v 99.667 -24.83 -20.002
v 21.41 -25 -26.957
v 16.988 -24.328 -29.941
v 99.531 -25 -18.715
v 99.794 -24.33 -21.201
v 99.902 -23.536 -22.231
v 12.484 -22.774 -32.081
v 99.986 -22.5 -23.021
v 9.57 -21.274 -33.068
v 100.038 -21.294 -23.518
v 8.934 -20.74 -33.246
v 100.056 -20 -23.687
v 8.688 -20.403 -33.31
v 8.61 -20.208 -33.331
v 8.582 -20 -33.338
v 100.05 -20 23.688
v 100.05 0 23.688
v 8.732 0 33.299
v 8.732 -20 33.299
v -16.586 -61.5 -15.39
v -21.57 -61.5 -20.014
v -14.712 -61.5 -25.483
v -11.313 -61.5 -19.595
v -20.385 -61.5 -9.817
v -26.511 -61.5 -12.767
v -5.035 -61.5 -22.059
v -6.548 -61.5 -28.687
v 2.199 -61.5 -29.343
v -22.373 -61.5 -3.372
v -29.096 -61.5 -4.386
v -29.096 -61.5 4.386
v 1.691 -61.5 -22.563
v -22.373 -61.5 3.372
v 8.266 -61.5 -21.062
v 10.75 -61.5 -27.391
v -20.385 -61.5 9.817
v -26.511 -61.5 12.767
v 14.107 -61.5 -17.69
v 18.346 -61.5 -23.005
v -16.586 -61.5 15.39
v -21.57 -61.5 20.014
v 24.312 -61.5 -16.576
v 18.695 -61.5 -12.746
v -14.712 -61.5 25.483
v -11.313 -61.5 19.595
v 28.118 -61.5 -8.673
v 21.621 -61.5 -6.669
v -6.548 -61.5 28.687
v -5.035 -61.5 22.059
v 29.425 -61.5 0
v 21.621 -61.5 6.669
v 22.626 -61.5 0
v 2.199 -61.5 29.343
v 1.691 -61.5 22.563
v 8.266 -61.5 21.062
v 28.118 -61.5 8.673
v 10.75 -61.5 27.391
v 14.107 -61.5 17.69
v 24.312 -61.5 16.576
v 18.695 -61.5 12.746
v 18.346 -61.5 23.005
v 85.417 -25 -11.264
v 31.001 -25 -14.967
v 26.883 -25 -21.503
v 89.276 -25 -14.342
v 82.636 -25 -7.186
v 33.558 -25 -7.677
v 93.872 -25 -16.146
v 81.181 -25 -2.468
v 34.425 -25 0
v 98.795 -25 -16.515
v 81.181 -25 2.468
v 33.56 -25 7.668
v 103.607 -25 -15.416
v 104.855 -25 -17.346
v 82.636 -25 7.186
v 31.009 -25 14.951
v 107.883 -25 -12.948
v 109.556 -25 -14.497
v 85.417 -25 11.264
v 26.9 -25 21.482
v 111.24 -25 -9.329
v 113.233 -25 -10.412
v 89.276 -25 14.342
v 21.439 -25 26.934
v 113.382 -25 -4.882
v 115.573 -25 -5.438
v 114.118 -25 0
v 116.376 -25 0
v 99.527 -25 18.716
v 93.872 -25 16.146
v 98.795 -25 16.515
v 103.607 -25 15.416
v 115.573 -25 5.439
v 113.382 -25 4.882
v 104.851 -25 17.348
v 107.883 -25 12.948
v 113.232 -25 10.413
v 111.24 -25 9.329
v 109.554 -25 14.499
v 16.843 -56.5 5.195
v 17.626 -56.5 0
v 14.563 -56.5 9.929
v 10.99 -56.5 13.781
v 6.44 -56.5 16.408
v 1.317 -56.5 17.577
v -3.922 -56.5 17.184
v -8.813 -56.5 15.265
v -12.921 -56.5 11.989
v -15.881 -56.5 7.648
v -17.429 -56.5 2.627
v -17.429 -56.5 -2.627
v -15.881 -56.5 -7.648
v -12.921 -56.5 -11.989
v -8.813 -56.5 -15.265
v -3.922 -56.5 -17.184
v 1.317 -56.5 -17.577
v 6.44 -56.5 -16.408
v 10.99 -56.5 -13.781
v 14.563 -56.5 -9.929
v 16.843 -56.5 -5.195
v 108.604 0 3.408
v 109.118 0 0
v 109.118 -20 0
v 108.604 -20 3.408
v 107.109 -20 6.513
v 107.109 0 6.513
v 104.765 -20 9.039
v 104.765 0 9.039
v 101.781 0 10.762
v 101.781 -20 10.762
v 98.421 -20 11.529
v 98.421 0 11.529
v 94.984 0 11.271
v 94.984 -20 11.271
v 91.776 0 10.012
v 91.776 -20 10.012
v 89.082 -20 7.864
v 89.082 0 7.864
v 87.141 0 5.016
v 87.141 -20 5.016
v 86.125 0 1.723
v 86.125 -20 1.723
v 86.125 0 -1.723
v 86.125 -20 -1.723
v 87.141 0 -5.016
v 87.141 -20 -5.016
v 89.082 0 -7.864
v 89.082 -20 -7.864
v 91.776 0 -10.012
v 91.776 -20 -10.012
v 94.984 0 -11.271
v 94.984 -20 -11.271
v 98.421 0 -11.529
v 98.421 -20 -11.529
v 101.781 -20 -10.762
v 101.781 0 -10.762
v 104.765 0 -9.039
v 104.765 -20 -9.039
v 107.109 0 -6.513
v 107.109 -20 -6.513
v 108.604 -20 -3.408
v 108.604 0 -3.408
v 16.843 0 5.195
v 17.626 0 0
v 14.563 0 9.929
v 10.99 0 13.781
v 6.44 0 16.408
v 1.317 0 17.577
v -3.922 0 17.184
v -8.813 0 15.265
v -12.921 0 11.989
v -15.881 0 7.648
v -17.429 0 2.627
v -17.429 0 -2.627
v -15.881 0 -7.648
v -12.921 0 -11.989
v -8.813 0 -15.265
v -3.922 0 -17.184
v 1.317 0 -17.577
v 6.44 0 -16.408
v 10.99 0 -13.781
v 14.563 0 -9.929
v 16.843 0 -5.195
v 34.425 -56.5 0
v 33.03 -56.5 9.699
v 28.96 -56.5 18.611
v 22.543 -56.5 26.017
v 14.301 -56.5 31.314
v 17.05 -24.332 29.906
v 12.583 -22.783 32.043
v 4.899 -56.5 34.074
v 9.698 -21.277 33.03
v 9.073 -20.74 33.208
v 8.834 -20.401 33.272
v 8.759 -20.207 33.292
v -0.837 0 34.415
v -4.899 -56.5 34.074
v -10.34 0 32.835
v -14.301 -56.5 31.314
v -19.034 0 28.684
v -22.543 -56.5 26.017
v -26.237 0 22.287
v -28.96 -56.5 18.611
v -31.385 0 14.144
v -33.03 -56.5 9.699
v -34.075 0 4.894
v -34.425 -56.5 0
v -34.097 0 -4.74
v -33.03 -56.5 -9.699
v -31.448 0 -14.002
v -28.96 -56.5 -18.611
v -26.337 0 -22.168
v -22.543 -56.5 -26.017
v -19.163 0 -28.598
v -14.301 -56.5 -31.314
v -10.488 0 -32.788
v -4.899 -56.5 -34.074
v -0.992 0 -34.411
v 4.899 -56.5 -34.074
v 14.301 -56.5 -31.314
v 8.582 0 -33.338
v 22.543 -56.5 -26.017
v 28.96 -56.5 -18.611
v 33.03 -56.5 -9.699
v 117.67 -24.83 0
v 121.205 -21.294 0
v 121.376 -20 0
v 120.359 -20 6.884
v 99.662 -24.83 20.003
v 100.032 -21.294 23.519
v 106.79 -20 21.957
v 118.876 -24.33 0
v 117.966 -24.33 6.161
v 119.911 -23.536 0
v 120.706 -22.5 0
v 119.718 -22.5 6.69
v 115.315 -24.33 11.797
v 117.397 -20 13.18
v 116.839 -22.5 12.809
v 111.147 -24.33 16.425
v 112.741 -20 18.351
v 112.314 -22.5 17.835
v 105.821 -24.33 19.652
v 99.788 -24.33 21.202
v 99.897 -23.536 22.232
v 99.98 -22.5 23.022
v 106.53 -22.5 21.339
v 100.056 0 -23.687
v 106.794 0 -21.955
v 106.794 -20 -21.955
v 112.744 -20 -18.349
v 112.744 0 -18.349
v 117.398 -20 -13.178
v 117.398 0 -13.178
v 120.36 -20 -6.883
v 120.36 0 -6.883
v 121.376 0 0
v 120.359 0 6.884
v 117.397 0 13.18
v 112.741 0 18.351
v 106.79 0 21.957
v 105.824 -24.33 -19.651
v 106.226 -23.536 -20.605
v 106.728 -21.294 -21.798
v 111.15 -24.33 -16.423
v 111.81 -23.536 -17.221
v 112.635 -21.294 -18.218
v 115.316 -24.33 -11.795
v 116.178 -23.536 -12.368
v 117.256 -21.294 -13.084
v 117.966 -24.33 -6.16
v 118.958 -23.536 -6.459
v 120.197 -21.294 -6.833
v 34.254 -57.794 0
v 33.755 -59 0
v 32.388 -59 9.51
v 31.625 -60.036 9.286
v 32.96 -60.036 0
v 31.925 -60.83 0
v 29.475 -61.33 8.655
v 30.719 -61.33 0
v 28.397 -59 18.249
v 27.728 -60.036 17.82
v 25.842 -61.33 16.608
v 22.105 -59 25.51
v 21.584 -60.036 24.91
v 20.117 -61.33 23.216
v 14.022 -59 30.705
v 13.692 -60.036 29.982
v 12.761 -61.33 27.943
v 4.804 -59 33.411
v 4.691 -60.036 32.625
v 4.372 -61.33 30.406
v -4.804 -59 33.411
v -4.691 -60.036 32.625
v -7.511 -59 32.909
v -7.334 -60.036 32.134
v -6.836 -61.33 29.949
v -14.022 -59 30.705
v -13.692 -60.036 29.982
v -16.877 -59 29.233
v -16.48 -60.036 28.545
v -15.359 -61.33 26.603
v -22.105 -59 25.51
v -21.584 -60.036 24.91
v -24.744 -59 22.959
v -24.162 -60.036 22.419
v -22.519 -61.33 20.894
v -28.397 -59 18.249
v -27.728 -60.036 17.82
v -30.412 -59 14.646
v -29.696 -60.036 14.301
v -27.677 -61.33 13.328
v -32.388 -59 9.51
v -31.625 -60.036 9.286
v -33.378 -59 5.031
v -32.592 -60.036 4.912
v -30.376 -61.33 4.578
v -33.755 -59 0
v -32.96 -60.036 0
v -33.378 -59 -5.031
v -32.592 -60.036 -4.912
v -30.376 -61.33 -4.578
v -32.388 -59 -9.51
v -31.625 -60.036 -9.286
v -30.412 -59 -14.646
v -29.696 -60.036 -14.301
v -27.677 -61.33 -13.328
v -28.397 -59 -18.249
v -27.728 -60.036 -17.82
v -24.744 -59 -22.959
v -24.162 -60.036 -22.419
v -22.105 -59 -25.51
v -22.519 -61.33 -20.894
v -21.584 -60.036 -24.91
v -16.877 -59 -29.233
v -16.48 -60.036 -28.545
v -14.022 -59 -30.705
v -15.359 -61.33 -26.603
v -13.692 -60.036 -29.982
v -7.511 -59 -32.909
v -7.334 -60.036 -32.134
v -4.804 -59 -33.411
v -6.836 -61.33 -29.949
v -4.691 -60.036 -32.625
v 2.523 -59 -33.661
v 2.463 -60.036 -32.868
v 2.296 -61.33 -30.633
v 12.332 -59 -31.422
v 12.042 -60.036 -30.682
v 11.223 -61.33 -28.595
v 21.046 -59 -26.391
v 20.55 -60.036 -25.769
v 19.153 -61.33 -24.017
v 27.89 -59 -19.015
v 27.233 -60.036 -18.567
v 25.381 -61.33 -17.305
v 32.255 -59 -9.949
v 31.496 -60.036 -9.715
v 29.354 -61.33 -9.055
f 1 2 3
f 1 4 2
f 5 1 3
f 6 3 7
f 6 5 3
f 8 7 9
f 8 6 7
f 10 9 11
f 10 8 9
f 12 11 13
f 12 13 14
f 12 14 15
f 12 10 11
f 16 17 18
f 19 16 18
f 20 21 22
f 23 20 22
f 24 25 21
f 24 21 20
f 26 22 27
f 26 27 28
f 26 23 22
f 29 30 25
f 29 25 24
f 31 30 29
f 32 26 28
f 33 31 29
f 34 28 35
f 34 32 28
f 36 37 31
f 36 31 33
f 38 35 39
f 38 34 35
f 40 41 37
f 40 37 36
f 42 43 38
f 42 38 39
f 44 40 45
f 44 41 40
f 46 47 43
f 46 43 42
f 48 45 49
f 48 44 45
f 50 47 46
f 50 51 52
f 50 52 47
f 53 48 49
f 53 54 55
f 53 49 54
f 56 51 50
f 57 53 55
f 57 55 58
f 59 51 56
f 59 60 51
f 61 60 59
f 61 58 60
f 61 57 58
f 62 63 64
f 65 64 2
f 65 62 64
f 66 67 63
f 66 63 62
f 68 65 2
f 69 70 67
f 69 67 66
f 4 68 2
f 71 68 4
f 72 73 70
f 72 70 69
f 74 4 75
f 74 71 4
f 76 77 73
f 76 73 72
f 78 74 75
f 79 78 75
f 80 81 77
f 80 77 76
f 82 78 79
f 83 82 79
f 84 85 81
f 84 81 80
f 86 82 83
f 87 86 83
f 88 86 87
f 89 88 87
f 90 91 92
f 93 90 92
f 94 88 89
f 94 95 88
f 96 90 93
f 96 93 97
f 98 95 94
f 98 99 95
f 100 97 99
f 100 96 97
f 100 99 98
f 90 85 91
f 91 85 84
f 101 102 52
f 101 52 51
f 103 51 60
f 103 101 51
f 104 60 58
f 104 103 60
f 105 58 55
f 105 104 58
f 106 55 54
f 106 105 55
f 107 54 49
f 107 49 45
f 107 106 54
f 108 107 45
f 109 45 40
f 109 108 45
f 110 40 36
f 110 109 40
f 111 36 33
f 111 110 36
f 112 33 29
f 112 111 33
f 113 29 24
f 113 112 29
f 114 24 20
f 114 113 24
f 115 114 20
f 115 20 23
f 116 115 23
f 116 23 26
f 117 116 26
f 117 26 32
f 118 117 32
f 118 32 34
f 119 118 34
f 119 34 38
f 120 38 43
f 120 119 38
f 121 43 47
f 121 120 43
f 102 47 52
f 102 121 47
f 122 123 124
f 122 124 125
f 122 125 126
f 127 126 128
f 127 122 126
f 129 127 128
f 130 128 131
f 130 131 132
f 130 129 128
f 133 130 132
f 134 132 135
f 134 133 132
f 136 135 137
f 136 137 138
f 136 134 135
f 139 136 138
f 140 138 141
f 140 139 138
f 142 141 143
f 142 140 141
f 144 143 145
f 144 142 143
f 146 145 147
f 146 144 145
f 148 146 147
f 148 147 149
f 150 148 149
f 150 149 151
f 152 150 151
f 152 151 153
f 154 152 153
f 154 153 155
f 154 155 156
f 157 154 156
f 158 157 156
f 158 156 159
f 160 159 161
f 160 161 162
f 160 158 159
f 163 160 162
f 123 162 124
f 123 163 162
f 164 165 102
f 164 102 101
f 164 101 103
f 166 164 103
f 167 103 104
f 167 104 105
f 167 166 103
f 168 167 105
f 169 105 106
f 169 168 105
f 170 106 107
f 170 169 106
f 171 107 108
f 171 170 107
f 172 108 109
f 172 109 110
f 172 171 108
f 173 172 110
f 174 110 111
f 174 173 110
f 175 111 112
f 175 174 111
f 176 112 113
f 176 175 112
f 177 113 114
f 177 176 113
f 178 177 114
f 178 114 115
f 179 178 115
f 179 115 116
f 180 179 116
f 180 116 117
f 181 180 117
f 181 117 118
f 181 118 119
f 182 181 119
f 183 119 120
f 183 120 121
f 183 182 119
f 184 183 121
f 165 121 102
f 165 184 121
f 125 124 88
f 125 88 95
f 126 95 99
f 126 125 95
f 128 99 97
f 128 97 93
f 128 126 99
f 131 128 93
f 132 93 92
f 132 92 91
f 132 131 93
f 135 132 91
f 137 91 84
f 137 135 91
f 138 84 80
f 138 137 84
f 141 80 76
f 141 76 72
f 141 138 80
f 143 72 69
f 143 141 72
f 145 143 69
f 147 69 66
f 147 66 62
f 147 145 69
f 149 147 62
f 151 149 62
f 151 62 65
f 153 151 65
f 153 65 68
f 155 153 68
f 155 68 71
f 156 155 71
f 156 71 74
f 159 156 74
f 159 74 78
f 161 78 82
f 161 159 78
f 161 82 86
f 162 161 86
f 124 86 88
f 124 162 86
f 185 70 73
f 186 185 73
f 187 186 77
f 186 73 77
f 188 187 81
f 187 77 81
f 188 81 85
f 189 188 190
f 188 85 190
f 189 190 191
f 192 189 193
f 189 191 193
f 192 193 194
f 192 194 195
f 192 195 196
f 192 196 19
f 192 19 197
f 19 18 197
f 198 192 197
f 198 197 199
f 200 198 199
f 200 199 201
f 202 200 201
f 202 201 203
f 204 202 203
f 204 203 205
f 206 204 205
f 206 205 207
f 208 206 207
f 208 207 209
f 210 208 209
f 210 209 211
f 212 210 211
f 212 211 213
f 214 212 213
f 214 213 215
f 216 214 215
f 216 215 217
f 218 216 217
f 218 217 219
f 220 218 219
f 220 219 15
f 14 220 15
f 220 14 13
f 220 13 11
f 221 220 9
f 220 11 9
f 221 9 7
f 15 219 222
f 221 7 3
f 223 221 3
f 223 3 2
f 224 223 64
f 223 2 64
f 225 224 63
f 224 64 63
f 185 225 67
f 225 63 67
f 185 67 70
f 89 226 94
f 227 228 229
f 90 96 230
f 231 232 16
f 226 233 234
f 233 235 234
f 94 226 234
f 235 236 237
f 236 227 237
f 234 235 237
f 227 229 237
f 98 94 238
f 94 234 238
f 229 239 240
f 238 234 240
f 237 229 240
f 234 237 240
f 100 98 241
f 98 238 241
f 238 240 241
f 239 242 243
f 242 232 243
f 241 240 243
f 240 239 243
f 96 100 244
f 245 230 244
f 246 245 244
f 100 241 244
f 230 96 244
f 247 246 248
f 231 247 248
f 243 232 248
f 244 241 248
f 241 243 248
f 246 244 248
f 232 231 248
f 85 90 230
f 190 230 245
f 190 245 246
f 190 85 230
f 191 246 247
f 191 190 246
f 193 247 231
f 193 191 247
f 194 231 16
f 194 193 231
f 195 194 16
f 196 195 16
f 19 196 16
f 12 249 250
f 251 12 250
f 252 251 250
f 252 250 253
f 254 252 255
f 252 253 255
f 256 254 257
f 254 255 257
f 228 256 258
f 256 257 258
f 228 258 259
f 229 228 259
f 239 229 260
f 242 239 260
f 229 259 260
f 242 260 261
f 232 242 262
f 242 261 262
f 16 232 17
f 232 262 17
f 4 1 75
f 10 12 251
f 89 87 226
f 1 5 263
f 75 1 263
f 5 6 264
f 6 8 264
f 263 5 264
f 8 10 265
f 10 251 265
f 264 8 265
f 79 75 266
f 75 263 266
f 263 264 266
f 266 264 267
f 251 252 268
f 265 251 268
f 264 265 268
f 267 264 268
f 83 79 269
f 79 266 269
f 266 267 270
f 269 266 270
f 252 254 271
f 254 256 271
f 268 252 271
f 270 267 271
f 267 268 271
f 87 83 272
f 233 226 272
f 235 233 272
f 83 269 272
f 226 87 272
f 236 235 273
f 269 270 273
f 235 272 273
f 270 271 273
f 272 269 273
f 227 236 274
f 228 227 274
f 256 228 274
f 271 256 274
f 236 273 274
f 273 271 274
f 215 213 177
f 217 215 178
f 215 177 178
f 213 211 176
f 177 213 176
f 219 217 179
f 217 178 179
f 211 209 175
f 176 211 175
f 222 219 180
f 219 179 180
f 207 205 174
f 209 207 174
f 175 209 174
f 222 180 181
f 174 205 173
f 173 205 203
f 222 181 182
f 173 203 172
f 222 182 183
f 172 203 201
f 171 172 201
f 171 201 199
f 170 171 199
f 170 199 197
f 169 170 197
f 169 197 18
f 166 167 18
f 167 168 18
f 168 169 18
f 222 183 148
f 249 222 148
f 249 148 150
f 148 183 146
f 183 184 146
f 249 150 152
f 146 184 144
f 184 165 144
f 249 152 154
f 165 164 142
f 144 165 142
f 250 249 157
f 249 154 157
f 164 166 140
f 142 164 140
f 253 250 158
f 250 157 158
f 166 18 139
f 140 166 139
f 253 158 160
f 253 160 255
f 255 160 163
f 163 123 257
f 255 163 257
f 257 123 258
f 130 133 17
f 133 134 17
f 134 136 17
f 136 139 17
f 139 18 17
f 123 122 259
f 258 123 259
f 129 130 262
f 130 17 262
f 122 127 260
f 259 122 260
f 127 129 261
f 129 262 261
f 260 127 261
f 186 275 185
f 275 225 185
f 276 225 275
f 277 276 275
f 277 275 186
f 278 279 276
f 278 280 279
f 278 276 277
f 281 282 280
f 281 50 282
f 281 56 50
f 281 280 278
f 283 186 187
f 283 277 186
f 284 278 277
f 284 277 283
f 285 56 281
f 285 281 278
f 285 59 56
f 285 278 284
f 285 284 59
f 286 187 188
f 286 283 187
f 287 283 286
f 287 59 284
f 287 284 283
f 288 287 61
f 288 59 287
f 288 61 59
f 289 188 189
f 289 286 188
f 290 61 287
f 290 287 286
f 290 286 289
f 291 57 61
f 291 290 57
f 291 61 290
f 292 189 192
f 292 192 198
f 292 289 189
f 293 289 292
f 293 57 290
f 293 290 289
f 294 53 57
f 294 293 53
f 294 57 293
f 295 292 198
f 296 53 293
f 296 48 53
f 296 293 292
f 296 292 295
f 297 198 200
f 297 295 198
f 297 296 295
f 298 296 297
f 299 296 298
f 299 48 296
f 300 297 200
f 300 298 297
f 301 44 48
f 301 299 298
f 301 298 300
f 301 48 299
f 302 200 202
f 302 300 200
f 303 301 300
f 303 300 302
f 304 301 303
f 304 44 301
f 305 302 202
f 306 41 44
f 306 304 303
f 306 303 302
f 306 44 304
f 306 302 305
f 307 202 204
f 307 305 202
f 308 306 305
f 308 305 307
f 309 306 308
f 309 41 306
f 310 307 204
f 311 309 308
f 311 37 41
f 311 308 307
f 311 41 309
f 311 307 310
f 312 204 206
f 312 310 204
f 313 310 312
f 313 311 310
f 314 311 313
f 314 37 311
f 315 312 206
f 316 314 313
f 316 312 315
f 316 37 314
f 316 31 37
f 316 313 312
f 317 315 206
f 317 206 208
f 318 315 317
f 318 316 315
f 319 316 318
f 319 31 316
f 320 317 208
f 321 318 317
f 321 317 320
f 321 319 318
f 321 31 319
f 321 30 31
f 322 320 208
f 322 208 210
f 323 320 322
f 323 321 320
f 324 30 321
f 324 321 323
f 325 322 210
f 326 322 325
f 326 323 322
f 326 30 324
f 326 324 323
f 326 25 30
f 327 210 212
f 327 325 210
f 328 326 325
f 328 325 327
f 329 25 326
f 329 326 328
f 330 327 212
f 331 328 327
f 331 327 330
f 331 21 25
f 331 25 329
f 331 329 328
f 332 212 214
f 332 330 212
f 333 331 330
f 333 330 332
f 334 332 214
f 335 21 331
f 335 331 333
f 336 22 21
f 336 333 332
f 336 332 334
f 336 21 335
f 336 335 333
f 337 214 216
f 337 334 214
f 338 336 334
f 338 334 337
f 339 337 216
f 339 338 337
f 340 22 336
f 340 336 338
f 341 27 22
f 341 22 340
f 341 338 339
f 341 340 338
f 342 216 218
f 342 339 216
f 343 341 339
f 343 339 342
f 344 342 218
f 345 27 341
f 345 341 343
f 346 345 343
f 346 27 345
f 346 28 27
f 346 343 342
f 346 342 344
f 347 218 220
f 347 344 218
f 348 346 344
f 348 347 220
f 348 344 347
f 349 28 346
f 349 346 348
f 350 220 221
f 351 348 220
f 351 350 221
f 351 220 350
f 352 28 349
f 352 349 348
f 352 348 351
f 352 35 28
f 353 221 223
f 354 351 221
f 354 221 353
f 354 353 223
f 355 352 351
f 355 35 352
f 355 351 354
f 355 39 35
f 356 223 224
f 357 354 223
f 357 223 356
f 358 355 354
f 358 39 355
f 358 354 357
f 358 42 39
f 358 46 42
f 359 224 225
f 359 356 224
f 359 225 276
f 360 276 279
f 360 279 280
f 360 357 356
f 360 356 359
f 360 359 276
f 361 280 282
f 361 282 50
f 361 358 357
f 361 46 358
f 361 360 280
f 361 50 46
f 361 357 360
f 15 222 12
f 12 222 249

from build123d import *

# Parameters (mm, degrees)
F0_R     = 17.918738
F0_R_2   = 11.561225
F1_DEPTH = 25
F2_R     = 34.424869
F2_R_2   = 17.626187
F3_DEPTH = 61.5
F4_R     = 5
F5_SIZE  = 5
F6_SIZE  = 5
F7_R     = 5


with BuildPart() as f1:
    # F0 (on Front) → F1 (new body)
    with BuildSketch(Plane.XZ):
        with BuildLine():
            ThreePointArc((4.55913, -33.762444), (25.651635, -22.42057), (34.068876, 0))
            ThreePointArc((34.068876, 0), (25.85659, 22.183893), (5.178866, 33.672952))
            ThreePointArc((5.178866, 33.672952), (-34.067438, 0.313082), (4.55913, -33.762444))
        make_face()
        Circle(F0_R, mode=Mode.SUBTRACT)
        with BuildLine():
            ThreePointArc((5.178866, 33.672952), (25.85659, 22.183893), (34.068876, 0))
            ThreePointArc((34.068876, 0), (25.651635, -22.42057), (4.55913, -33.762444))
            Line((4.55913, -33.762444), (100.055945, -23.687435))
            ThreePointArc((100.055945, -23.687435), (73.738, -0.002993), (100.049991, 23.688063))
            Line((100.049991, 23.688063), (5.178866, 33.672952))
        make_face()
        with BuildLine():
            ThreePointArc((121.375793, 0), (115.25891, 15.936704), (100.049991, 23.688063))
            ThreePointArc((100.049991, 23.688063), (73.738, -0.002993), (100.055945, -23.687435))
            ThreePointArc((100.055945, -23.687435), (115.260913, -15.934479), (121.375793, 0))
        make_face()
        with Locations((97.556897, 0)):
            Circle(F0_R_2, mode=Mode.SUBTRACT)
    extrude(amount=F1_DEPTH)

    # F2 (on Front) → F3 (join)
    with BuildSketch(Plane.XZ):
        Circle(F2_R)
        Circle(F2_R_2, mode=Mode.SUBTRACT)
    extrude(amount=F3_DEPTH)

    # F4
    f4_edges = [f1.edges().sort_by_distance(p)[0] for p in [
        (-34.424869, -61.5, 0),
    ]]
    fillet(f4_edges, radius=F4_R)

    # F5
    f5_edges = [f1.edges().sort_by_distance(p)[0] for p in [
        (-17.626187, -61.5, 0),
    ]]
    chamfer(f5_edges, length=F5_SIZE)

    # F6
    f6_edges = [f1.edges().sort_by_distance(p)[0] for p in [
        (85.995671, -25, 0),
    ]]
    chamfer(f6_edges, length=F6_SIZE)

    # F7
    f7_edges = [f1.edges().sort_by_distance(p)[0] for p in [
        (54.318812, -25, -28.512748),
    ]]
    fillet(f7_edges, radius=F7_R)


solid = f1.part
